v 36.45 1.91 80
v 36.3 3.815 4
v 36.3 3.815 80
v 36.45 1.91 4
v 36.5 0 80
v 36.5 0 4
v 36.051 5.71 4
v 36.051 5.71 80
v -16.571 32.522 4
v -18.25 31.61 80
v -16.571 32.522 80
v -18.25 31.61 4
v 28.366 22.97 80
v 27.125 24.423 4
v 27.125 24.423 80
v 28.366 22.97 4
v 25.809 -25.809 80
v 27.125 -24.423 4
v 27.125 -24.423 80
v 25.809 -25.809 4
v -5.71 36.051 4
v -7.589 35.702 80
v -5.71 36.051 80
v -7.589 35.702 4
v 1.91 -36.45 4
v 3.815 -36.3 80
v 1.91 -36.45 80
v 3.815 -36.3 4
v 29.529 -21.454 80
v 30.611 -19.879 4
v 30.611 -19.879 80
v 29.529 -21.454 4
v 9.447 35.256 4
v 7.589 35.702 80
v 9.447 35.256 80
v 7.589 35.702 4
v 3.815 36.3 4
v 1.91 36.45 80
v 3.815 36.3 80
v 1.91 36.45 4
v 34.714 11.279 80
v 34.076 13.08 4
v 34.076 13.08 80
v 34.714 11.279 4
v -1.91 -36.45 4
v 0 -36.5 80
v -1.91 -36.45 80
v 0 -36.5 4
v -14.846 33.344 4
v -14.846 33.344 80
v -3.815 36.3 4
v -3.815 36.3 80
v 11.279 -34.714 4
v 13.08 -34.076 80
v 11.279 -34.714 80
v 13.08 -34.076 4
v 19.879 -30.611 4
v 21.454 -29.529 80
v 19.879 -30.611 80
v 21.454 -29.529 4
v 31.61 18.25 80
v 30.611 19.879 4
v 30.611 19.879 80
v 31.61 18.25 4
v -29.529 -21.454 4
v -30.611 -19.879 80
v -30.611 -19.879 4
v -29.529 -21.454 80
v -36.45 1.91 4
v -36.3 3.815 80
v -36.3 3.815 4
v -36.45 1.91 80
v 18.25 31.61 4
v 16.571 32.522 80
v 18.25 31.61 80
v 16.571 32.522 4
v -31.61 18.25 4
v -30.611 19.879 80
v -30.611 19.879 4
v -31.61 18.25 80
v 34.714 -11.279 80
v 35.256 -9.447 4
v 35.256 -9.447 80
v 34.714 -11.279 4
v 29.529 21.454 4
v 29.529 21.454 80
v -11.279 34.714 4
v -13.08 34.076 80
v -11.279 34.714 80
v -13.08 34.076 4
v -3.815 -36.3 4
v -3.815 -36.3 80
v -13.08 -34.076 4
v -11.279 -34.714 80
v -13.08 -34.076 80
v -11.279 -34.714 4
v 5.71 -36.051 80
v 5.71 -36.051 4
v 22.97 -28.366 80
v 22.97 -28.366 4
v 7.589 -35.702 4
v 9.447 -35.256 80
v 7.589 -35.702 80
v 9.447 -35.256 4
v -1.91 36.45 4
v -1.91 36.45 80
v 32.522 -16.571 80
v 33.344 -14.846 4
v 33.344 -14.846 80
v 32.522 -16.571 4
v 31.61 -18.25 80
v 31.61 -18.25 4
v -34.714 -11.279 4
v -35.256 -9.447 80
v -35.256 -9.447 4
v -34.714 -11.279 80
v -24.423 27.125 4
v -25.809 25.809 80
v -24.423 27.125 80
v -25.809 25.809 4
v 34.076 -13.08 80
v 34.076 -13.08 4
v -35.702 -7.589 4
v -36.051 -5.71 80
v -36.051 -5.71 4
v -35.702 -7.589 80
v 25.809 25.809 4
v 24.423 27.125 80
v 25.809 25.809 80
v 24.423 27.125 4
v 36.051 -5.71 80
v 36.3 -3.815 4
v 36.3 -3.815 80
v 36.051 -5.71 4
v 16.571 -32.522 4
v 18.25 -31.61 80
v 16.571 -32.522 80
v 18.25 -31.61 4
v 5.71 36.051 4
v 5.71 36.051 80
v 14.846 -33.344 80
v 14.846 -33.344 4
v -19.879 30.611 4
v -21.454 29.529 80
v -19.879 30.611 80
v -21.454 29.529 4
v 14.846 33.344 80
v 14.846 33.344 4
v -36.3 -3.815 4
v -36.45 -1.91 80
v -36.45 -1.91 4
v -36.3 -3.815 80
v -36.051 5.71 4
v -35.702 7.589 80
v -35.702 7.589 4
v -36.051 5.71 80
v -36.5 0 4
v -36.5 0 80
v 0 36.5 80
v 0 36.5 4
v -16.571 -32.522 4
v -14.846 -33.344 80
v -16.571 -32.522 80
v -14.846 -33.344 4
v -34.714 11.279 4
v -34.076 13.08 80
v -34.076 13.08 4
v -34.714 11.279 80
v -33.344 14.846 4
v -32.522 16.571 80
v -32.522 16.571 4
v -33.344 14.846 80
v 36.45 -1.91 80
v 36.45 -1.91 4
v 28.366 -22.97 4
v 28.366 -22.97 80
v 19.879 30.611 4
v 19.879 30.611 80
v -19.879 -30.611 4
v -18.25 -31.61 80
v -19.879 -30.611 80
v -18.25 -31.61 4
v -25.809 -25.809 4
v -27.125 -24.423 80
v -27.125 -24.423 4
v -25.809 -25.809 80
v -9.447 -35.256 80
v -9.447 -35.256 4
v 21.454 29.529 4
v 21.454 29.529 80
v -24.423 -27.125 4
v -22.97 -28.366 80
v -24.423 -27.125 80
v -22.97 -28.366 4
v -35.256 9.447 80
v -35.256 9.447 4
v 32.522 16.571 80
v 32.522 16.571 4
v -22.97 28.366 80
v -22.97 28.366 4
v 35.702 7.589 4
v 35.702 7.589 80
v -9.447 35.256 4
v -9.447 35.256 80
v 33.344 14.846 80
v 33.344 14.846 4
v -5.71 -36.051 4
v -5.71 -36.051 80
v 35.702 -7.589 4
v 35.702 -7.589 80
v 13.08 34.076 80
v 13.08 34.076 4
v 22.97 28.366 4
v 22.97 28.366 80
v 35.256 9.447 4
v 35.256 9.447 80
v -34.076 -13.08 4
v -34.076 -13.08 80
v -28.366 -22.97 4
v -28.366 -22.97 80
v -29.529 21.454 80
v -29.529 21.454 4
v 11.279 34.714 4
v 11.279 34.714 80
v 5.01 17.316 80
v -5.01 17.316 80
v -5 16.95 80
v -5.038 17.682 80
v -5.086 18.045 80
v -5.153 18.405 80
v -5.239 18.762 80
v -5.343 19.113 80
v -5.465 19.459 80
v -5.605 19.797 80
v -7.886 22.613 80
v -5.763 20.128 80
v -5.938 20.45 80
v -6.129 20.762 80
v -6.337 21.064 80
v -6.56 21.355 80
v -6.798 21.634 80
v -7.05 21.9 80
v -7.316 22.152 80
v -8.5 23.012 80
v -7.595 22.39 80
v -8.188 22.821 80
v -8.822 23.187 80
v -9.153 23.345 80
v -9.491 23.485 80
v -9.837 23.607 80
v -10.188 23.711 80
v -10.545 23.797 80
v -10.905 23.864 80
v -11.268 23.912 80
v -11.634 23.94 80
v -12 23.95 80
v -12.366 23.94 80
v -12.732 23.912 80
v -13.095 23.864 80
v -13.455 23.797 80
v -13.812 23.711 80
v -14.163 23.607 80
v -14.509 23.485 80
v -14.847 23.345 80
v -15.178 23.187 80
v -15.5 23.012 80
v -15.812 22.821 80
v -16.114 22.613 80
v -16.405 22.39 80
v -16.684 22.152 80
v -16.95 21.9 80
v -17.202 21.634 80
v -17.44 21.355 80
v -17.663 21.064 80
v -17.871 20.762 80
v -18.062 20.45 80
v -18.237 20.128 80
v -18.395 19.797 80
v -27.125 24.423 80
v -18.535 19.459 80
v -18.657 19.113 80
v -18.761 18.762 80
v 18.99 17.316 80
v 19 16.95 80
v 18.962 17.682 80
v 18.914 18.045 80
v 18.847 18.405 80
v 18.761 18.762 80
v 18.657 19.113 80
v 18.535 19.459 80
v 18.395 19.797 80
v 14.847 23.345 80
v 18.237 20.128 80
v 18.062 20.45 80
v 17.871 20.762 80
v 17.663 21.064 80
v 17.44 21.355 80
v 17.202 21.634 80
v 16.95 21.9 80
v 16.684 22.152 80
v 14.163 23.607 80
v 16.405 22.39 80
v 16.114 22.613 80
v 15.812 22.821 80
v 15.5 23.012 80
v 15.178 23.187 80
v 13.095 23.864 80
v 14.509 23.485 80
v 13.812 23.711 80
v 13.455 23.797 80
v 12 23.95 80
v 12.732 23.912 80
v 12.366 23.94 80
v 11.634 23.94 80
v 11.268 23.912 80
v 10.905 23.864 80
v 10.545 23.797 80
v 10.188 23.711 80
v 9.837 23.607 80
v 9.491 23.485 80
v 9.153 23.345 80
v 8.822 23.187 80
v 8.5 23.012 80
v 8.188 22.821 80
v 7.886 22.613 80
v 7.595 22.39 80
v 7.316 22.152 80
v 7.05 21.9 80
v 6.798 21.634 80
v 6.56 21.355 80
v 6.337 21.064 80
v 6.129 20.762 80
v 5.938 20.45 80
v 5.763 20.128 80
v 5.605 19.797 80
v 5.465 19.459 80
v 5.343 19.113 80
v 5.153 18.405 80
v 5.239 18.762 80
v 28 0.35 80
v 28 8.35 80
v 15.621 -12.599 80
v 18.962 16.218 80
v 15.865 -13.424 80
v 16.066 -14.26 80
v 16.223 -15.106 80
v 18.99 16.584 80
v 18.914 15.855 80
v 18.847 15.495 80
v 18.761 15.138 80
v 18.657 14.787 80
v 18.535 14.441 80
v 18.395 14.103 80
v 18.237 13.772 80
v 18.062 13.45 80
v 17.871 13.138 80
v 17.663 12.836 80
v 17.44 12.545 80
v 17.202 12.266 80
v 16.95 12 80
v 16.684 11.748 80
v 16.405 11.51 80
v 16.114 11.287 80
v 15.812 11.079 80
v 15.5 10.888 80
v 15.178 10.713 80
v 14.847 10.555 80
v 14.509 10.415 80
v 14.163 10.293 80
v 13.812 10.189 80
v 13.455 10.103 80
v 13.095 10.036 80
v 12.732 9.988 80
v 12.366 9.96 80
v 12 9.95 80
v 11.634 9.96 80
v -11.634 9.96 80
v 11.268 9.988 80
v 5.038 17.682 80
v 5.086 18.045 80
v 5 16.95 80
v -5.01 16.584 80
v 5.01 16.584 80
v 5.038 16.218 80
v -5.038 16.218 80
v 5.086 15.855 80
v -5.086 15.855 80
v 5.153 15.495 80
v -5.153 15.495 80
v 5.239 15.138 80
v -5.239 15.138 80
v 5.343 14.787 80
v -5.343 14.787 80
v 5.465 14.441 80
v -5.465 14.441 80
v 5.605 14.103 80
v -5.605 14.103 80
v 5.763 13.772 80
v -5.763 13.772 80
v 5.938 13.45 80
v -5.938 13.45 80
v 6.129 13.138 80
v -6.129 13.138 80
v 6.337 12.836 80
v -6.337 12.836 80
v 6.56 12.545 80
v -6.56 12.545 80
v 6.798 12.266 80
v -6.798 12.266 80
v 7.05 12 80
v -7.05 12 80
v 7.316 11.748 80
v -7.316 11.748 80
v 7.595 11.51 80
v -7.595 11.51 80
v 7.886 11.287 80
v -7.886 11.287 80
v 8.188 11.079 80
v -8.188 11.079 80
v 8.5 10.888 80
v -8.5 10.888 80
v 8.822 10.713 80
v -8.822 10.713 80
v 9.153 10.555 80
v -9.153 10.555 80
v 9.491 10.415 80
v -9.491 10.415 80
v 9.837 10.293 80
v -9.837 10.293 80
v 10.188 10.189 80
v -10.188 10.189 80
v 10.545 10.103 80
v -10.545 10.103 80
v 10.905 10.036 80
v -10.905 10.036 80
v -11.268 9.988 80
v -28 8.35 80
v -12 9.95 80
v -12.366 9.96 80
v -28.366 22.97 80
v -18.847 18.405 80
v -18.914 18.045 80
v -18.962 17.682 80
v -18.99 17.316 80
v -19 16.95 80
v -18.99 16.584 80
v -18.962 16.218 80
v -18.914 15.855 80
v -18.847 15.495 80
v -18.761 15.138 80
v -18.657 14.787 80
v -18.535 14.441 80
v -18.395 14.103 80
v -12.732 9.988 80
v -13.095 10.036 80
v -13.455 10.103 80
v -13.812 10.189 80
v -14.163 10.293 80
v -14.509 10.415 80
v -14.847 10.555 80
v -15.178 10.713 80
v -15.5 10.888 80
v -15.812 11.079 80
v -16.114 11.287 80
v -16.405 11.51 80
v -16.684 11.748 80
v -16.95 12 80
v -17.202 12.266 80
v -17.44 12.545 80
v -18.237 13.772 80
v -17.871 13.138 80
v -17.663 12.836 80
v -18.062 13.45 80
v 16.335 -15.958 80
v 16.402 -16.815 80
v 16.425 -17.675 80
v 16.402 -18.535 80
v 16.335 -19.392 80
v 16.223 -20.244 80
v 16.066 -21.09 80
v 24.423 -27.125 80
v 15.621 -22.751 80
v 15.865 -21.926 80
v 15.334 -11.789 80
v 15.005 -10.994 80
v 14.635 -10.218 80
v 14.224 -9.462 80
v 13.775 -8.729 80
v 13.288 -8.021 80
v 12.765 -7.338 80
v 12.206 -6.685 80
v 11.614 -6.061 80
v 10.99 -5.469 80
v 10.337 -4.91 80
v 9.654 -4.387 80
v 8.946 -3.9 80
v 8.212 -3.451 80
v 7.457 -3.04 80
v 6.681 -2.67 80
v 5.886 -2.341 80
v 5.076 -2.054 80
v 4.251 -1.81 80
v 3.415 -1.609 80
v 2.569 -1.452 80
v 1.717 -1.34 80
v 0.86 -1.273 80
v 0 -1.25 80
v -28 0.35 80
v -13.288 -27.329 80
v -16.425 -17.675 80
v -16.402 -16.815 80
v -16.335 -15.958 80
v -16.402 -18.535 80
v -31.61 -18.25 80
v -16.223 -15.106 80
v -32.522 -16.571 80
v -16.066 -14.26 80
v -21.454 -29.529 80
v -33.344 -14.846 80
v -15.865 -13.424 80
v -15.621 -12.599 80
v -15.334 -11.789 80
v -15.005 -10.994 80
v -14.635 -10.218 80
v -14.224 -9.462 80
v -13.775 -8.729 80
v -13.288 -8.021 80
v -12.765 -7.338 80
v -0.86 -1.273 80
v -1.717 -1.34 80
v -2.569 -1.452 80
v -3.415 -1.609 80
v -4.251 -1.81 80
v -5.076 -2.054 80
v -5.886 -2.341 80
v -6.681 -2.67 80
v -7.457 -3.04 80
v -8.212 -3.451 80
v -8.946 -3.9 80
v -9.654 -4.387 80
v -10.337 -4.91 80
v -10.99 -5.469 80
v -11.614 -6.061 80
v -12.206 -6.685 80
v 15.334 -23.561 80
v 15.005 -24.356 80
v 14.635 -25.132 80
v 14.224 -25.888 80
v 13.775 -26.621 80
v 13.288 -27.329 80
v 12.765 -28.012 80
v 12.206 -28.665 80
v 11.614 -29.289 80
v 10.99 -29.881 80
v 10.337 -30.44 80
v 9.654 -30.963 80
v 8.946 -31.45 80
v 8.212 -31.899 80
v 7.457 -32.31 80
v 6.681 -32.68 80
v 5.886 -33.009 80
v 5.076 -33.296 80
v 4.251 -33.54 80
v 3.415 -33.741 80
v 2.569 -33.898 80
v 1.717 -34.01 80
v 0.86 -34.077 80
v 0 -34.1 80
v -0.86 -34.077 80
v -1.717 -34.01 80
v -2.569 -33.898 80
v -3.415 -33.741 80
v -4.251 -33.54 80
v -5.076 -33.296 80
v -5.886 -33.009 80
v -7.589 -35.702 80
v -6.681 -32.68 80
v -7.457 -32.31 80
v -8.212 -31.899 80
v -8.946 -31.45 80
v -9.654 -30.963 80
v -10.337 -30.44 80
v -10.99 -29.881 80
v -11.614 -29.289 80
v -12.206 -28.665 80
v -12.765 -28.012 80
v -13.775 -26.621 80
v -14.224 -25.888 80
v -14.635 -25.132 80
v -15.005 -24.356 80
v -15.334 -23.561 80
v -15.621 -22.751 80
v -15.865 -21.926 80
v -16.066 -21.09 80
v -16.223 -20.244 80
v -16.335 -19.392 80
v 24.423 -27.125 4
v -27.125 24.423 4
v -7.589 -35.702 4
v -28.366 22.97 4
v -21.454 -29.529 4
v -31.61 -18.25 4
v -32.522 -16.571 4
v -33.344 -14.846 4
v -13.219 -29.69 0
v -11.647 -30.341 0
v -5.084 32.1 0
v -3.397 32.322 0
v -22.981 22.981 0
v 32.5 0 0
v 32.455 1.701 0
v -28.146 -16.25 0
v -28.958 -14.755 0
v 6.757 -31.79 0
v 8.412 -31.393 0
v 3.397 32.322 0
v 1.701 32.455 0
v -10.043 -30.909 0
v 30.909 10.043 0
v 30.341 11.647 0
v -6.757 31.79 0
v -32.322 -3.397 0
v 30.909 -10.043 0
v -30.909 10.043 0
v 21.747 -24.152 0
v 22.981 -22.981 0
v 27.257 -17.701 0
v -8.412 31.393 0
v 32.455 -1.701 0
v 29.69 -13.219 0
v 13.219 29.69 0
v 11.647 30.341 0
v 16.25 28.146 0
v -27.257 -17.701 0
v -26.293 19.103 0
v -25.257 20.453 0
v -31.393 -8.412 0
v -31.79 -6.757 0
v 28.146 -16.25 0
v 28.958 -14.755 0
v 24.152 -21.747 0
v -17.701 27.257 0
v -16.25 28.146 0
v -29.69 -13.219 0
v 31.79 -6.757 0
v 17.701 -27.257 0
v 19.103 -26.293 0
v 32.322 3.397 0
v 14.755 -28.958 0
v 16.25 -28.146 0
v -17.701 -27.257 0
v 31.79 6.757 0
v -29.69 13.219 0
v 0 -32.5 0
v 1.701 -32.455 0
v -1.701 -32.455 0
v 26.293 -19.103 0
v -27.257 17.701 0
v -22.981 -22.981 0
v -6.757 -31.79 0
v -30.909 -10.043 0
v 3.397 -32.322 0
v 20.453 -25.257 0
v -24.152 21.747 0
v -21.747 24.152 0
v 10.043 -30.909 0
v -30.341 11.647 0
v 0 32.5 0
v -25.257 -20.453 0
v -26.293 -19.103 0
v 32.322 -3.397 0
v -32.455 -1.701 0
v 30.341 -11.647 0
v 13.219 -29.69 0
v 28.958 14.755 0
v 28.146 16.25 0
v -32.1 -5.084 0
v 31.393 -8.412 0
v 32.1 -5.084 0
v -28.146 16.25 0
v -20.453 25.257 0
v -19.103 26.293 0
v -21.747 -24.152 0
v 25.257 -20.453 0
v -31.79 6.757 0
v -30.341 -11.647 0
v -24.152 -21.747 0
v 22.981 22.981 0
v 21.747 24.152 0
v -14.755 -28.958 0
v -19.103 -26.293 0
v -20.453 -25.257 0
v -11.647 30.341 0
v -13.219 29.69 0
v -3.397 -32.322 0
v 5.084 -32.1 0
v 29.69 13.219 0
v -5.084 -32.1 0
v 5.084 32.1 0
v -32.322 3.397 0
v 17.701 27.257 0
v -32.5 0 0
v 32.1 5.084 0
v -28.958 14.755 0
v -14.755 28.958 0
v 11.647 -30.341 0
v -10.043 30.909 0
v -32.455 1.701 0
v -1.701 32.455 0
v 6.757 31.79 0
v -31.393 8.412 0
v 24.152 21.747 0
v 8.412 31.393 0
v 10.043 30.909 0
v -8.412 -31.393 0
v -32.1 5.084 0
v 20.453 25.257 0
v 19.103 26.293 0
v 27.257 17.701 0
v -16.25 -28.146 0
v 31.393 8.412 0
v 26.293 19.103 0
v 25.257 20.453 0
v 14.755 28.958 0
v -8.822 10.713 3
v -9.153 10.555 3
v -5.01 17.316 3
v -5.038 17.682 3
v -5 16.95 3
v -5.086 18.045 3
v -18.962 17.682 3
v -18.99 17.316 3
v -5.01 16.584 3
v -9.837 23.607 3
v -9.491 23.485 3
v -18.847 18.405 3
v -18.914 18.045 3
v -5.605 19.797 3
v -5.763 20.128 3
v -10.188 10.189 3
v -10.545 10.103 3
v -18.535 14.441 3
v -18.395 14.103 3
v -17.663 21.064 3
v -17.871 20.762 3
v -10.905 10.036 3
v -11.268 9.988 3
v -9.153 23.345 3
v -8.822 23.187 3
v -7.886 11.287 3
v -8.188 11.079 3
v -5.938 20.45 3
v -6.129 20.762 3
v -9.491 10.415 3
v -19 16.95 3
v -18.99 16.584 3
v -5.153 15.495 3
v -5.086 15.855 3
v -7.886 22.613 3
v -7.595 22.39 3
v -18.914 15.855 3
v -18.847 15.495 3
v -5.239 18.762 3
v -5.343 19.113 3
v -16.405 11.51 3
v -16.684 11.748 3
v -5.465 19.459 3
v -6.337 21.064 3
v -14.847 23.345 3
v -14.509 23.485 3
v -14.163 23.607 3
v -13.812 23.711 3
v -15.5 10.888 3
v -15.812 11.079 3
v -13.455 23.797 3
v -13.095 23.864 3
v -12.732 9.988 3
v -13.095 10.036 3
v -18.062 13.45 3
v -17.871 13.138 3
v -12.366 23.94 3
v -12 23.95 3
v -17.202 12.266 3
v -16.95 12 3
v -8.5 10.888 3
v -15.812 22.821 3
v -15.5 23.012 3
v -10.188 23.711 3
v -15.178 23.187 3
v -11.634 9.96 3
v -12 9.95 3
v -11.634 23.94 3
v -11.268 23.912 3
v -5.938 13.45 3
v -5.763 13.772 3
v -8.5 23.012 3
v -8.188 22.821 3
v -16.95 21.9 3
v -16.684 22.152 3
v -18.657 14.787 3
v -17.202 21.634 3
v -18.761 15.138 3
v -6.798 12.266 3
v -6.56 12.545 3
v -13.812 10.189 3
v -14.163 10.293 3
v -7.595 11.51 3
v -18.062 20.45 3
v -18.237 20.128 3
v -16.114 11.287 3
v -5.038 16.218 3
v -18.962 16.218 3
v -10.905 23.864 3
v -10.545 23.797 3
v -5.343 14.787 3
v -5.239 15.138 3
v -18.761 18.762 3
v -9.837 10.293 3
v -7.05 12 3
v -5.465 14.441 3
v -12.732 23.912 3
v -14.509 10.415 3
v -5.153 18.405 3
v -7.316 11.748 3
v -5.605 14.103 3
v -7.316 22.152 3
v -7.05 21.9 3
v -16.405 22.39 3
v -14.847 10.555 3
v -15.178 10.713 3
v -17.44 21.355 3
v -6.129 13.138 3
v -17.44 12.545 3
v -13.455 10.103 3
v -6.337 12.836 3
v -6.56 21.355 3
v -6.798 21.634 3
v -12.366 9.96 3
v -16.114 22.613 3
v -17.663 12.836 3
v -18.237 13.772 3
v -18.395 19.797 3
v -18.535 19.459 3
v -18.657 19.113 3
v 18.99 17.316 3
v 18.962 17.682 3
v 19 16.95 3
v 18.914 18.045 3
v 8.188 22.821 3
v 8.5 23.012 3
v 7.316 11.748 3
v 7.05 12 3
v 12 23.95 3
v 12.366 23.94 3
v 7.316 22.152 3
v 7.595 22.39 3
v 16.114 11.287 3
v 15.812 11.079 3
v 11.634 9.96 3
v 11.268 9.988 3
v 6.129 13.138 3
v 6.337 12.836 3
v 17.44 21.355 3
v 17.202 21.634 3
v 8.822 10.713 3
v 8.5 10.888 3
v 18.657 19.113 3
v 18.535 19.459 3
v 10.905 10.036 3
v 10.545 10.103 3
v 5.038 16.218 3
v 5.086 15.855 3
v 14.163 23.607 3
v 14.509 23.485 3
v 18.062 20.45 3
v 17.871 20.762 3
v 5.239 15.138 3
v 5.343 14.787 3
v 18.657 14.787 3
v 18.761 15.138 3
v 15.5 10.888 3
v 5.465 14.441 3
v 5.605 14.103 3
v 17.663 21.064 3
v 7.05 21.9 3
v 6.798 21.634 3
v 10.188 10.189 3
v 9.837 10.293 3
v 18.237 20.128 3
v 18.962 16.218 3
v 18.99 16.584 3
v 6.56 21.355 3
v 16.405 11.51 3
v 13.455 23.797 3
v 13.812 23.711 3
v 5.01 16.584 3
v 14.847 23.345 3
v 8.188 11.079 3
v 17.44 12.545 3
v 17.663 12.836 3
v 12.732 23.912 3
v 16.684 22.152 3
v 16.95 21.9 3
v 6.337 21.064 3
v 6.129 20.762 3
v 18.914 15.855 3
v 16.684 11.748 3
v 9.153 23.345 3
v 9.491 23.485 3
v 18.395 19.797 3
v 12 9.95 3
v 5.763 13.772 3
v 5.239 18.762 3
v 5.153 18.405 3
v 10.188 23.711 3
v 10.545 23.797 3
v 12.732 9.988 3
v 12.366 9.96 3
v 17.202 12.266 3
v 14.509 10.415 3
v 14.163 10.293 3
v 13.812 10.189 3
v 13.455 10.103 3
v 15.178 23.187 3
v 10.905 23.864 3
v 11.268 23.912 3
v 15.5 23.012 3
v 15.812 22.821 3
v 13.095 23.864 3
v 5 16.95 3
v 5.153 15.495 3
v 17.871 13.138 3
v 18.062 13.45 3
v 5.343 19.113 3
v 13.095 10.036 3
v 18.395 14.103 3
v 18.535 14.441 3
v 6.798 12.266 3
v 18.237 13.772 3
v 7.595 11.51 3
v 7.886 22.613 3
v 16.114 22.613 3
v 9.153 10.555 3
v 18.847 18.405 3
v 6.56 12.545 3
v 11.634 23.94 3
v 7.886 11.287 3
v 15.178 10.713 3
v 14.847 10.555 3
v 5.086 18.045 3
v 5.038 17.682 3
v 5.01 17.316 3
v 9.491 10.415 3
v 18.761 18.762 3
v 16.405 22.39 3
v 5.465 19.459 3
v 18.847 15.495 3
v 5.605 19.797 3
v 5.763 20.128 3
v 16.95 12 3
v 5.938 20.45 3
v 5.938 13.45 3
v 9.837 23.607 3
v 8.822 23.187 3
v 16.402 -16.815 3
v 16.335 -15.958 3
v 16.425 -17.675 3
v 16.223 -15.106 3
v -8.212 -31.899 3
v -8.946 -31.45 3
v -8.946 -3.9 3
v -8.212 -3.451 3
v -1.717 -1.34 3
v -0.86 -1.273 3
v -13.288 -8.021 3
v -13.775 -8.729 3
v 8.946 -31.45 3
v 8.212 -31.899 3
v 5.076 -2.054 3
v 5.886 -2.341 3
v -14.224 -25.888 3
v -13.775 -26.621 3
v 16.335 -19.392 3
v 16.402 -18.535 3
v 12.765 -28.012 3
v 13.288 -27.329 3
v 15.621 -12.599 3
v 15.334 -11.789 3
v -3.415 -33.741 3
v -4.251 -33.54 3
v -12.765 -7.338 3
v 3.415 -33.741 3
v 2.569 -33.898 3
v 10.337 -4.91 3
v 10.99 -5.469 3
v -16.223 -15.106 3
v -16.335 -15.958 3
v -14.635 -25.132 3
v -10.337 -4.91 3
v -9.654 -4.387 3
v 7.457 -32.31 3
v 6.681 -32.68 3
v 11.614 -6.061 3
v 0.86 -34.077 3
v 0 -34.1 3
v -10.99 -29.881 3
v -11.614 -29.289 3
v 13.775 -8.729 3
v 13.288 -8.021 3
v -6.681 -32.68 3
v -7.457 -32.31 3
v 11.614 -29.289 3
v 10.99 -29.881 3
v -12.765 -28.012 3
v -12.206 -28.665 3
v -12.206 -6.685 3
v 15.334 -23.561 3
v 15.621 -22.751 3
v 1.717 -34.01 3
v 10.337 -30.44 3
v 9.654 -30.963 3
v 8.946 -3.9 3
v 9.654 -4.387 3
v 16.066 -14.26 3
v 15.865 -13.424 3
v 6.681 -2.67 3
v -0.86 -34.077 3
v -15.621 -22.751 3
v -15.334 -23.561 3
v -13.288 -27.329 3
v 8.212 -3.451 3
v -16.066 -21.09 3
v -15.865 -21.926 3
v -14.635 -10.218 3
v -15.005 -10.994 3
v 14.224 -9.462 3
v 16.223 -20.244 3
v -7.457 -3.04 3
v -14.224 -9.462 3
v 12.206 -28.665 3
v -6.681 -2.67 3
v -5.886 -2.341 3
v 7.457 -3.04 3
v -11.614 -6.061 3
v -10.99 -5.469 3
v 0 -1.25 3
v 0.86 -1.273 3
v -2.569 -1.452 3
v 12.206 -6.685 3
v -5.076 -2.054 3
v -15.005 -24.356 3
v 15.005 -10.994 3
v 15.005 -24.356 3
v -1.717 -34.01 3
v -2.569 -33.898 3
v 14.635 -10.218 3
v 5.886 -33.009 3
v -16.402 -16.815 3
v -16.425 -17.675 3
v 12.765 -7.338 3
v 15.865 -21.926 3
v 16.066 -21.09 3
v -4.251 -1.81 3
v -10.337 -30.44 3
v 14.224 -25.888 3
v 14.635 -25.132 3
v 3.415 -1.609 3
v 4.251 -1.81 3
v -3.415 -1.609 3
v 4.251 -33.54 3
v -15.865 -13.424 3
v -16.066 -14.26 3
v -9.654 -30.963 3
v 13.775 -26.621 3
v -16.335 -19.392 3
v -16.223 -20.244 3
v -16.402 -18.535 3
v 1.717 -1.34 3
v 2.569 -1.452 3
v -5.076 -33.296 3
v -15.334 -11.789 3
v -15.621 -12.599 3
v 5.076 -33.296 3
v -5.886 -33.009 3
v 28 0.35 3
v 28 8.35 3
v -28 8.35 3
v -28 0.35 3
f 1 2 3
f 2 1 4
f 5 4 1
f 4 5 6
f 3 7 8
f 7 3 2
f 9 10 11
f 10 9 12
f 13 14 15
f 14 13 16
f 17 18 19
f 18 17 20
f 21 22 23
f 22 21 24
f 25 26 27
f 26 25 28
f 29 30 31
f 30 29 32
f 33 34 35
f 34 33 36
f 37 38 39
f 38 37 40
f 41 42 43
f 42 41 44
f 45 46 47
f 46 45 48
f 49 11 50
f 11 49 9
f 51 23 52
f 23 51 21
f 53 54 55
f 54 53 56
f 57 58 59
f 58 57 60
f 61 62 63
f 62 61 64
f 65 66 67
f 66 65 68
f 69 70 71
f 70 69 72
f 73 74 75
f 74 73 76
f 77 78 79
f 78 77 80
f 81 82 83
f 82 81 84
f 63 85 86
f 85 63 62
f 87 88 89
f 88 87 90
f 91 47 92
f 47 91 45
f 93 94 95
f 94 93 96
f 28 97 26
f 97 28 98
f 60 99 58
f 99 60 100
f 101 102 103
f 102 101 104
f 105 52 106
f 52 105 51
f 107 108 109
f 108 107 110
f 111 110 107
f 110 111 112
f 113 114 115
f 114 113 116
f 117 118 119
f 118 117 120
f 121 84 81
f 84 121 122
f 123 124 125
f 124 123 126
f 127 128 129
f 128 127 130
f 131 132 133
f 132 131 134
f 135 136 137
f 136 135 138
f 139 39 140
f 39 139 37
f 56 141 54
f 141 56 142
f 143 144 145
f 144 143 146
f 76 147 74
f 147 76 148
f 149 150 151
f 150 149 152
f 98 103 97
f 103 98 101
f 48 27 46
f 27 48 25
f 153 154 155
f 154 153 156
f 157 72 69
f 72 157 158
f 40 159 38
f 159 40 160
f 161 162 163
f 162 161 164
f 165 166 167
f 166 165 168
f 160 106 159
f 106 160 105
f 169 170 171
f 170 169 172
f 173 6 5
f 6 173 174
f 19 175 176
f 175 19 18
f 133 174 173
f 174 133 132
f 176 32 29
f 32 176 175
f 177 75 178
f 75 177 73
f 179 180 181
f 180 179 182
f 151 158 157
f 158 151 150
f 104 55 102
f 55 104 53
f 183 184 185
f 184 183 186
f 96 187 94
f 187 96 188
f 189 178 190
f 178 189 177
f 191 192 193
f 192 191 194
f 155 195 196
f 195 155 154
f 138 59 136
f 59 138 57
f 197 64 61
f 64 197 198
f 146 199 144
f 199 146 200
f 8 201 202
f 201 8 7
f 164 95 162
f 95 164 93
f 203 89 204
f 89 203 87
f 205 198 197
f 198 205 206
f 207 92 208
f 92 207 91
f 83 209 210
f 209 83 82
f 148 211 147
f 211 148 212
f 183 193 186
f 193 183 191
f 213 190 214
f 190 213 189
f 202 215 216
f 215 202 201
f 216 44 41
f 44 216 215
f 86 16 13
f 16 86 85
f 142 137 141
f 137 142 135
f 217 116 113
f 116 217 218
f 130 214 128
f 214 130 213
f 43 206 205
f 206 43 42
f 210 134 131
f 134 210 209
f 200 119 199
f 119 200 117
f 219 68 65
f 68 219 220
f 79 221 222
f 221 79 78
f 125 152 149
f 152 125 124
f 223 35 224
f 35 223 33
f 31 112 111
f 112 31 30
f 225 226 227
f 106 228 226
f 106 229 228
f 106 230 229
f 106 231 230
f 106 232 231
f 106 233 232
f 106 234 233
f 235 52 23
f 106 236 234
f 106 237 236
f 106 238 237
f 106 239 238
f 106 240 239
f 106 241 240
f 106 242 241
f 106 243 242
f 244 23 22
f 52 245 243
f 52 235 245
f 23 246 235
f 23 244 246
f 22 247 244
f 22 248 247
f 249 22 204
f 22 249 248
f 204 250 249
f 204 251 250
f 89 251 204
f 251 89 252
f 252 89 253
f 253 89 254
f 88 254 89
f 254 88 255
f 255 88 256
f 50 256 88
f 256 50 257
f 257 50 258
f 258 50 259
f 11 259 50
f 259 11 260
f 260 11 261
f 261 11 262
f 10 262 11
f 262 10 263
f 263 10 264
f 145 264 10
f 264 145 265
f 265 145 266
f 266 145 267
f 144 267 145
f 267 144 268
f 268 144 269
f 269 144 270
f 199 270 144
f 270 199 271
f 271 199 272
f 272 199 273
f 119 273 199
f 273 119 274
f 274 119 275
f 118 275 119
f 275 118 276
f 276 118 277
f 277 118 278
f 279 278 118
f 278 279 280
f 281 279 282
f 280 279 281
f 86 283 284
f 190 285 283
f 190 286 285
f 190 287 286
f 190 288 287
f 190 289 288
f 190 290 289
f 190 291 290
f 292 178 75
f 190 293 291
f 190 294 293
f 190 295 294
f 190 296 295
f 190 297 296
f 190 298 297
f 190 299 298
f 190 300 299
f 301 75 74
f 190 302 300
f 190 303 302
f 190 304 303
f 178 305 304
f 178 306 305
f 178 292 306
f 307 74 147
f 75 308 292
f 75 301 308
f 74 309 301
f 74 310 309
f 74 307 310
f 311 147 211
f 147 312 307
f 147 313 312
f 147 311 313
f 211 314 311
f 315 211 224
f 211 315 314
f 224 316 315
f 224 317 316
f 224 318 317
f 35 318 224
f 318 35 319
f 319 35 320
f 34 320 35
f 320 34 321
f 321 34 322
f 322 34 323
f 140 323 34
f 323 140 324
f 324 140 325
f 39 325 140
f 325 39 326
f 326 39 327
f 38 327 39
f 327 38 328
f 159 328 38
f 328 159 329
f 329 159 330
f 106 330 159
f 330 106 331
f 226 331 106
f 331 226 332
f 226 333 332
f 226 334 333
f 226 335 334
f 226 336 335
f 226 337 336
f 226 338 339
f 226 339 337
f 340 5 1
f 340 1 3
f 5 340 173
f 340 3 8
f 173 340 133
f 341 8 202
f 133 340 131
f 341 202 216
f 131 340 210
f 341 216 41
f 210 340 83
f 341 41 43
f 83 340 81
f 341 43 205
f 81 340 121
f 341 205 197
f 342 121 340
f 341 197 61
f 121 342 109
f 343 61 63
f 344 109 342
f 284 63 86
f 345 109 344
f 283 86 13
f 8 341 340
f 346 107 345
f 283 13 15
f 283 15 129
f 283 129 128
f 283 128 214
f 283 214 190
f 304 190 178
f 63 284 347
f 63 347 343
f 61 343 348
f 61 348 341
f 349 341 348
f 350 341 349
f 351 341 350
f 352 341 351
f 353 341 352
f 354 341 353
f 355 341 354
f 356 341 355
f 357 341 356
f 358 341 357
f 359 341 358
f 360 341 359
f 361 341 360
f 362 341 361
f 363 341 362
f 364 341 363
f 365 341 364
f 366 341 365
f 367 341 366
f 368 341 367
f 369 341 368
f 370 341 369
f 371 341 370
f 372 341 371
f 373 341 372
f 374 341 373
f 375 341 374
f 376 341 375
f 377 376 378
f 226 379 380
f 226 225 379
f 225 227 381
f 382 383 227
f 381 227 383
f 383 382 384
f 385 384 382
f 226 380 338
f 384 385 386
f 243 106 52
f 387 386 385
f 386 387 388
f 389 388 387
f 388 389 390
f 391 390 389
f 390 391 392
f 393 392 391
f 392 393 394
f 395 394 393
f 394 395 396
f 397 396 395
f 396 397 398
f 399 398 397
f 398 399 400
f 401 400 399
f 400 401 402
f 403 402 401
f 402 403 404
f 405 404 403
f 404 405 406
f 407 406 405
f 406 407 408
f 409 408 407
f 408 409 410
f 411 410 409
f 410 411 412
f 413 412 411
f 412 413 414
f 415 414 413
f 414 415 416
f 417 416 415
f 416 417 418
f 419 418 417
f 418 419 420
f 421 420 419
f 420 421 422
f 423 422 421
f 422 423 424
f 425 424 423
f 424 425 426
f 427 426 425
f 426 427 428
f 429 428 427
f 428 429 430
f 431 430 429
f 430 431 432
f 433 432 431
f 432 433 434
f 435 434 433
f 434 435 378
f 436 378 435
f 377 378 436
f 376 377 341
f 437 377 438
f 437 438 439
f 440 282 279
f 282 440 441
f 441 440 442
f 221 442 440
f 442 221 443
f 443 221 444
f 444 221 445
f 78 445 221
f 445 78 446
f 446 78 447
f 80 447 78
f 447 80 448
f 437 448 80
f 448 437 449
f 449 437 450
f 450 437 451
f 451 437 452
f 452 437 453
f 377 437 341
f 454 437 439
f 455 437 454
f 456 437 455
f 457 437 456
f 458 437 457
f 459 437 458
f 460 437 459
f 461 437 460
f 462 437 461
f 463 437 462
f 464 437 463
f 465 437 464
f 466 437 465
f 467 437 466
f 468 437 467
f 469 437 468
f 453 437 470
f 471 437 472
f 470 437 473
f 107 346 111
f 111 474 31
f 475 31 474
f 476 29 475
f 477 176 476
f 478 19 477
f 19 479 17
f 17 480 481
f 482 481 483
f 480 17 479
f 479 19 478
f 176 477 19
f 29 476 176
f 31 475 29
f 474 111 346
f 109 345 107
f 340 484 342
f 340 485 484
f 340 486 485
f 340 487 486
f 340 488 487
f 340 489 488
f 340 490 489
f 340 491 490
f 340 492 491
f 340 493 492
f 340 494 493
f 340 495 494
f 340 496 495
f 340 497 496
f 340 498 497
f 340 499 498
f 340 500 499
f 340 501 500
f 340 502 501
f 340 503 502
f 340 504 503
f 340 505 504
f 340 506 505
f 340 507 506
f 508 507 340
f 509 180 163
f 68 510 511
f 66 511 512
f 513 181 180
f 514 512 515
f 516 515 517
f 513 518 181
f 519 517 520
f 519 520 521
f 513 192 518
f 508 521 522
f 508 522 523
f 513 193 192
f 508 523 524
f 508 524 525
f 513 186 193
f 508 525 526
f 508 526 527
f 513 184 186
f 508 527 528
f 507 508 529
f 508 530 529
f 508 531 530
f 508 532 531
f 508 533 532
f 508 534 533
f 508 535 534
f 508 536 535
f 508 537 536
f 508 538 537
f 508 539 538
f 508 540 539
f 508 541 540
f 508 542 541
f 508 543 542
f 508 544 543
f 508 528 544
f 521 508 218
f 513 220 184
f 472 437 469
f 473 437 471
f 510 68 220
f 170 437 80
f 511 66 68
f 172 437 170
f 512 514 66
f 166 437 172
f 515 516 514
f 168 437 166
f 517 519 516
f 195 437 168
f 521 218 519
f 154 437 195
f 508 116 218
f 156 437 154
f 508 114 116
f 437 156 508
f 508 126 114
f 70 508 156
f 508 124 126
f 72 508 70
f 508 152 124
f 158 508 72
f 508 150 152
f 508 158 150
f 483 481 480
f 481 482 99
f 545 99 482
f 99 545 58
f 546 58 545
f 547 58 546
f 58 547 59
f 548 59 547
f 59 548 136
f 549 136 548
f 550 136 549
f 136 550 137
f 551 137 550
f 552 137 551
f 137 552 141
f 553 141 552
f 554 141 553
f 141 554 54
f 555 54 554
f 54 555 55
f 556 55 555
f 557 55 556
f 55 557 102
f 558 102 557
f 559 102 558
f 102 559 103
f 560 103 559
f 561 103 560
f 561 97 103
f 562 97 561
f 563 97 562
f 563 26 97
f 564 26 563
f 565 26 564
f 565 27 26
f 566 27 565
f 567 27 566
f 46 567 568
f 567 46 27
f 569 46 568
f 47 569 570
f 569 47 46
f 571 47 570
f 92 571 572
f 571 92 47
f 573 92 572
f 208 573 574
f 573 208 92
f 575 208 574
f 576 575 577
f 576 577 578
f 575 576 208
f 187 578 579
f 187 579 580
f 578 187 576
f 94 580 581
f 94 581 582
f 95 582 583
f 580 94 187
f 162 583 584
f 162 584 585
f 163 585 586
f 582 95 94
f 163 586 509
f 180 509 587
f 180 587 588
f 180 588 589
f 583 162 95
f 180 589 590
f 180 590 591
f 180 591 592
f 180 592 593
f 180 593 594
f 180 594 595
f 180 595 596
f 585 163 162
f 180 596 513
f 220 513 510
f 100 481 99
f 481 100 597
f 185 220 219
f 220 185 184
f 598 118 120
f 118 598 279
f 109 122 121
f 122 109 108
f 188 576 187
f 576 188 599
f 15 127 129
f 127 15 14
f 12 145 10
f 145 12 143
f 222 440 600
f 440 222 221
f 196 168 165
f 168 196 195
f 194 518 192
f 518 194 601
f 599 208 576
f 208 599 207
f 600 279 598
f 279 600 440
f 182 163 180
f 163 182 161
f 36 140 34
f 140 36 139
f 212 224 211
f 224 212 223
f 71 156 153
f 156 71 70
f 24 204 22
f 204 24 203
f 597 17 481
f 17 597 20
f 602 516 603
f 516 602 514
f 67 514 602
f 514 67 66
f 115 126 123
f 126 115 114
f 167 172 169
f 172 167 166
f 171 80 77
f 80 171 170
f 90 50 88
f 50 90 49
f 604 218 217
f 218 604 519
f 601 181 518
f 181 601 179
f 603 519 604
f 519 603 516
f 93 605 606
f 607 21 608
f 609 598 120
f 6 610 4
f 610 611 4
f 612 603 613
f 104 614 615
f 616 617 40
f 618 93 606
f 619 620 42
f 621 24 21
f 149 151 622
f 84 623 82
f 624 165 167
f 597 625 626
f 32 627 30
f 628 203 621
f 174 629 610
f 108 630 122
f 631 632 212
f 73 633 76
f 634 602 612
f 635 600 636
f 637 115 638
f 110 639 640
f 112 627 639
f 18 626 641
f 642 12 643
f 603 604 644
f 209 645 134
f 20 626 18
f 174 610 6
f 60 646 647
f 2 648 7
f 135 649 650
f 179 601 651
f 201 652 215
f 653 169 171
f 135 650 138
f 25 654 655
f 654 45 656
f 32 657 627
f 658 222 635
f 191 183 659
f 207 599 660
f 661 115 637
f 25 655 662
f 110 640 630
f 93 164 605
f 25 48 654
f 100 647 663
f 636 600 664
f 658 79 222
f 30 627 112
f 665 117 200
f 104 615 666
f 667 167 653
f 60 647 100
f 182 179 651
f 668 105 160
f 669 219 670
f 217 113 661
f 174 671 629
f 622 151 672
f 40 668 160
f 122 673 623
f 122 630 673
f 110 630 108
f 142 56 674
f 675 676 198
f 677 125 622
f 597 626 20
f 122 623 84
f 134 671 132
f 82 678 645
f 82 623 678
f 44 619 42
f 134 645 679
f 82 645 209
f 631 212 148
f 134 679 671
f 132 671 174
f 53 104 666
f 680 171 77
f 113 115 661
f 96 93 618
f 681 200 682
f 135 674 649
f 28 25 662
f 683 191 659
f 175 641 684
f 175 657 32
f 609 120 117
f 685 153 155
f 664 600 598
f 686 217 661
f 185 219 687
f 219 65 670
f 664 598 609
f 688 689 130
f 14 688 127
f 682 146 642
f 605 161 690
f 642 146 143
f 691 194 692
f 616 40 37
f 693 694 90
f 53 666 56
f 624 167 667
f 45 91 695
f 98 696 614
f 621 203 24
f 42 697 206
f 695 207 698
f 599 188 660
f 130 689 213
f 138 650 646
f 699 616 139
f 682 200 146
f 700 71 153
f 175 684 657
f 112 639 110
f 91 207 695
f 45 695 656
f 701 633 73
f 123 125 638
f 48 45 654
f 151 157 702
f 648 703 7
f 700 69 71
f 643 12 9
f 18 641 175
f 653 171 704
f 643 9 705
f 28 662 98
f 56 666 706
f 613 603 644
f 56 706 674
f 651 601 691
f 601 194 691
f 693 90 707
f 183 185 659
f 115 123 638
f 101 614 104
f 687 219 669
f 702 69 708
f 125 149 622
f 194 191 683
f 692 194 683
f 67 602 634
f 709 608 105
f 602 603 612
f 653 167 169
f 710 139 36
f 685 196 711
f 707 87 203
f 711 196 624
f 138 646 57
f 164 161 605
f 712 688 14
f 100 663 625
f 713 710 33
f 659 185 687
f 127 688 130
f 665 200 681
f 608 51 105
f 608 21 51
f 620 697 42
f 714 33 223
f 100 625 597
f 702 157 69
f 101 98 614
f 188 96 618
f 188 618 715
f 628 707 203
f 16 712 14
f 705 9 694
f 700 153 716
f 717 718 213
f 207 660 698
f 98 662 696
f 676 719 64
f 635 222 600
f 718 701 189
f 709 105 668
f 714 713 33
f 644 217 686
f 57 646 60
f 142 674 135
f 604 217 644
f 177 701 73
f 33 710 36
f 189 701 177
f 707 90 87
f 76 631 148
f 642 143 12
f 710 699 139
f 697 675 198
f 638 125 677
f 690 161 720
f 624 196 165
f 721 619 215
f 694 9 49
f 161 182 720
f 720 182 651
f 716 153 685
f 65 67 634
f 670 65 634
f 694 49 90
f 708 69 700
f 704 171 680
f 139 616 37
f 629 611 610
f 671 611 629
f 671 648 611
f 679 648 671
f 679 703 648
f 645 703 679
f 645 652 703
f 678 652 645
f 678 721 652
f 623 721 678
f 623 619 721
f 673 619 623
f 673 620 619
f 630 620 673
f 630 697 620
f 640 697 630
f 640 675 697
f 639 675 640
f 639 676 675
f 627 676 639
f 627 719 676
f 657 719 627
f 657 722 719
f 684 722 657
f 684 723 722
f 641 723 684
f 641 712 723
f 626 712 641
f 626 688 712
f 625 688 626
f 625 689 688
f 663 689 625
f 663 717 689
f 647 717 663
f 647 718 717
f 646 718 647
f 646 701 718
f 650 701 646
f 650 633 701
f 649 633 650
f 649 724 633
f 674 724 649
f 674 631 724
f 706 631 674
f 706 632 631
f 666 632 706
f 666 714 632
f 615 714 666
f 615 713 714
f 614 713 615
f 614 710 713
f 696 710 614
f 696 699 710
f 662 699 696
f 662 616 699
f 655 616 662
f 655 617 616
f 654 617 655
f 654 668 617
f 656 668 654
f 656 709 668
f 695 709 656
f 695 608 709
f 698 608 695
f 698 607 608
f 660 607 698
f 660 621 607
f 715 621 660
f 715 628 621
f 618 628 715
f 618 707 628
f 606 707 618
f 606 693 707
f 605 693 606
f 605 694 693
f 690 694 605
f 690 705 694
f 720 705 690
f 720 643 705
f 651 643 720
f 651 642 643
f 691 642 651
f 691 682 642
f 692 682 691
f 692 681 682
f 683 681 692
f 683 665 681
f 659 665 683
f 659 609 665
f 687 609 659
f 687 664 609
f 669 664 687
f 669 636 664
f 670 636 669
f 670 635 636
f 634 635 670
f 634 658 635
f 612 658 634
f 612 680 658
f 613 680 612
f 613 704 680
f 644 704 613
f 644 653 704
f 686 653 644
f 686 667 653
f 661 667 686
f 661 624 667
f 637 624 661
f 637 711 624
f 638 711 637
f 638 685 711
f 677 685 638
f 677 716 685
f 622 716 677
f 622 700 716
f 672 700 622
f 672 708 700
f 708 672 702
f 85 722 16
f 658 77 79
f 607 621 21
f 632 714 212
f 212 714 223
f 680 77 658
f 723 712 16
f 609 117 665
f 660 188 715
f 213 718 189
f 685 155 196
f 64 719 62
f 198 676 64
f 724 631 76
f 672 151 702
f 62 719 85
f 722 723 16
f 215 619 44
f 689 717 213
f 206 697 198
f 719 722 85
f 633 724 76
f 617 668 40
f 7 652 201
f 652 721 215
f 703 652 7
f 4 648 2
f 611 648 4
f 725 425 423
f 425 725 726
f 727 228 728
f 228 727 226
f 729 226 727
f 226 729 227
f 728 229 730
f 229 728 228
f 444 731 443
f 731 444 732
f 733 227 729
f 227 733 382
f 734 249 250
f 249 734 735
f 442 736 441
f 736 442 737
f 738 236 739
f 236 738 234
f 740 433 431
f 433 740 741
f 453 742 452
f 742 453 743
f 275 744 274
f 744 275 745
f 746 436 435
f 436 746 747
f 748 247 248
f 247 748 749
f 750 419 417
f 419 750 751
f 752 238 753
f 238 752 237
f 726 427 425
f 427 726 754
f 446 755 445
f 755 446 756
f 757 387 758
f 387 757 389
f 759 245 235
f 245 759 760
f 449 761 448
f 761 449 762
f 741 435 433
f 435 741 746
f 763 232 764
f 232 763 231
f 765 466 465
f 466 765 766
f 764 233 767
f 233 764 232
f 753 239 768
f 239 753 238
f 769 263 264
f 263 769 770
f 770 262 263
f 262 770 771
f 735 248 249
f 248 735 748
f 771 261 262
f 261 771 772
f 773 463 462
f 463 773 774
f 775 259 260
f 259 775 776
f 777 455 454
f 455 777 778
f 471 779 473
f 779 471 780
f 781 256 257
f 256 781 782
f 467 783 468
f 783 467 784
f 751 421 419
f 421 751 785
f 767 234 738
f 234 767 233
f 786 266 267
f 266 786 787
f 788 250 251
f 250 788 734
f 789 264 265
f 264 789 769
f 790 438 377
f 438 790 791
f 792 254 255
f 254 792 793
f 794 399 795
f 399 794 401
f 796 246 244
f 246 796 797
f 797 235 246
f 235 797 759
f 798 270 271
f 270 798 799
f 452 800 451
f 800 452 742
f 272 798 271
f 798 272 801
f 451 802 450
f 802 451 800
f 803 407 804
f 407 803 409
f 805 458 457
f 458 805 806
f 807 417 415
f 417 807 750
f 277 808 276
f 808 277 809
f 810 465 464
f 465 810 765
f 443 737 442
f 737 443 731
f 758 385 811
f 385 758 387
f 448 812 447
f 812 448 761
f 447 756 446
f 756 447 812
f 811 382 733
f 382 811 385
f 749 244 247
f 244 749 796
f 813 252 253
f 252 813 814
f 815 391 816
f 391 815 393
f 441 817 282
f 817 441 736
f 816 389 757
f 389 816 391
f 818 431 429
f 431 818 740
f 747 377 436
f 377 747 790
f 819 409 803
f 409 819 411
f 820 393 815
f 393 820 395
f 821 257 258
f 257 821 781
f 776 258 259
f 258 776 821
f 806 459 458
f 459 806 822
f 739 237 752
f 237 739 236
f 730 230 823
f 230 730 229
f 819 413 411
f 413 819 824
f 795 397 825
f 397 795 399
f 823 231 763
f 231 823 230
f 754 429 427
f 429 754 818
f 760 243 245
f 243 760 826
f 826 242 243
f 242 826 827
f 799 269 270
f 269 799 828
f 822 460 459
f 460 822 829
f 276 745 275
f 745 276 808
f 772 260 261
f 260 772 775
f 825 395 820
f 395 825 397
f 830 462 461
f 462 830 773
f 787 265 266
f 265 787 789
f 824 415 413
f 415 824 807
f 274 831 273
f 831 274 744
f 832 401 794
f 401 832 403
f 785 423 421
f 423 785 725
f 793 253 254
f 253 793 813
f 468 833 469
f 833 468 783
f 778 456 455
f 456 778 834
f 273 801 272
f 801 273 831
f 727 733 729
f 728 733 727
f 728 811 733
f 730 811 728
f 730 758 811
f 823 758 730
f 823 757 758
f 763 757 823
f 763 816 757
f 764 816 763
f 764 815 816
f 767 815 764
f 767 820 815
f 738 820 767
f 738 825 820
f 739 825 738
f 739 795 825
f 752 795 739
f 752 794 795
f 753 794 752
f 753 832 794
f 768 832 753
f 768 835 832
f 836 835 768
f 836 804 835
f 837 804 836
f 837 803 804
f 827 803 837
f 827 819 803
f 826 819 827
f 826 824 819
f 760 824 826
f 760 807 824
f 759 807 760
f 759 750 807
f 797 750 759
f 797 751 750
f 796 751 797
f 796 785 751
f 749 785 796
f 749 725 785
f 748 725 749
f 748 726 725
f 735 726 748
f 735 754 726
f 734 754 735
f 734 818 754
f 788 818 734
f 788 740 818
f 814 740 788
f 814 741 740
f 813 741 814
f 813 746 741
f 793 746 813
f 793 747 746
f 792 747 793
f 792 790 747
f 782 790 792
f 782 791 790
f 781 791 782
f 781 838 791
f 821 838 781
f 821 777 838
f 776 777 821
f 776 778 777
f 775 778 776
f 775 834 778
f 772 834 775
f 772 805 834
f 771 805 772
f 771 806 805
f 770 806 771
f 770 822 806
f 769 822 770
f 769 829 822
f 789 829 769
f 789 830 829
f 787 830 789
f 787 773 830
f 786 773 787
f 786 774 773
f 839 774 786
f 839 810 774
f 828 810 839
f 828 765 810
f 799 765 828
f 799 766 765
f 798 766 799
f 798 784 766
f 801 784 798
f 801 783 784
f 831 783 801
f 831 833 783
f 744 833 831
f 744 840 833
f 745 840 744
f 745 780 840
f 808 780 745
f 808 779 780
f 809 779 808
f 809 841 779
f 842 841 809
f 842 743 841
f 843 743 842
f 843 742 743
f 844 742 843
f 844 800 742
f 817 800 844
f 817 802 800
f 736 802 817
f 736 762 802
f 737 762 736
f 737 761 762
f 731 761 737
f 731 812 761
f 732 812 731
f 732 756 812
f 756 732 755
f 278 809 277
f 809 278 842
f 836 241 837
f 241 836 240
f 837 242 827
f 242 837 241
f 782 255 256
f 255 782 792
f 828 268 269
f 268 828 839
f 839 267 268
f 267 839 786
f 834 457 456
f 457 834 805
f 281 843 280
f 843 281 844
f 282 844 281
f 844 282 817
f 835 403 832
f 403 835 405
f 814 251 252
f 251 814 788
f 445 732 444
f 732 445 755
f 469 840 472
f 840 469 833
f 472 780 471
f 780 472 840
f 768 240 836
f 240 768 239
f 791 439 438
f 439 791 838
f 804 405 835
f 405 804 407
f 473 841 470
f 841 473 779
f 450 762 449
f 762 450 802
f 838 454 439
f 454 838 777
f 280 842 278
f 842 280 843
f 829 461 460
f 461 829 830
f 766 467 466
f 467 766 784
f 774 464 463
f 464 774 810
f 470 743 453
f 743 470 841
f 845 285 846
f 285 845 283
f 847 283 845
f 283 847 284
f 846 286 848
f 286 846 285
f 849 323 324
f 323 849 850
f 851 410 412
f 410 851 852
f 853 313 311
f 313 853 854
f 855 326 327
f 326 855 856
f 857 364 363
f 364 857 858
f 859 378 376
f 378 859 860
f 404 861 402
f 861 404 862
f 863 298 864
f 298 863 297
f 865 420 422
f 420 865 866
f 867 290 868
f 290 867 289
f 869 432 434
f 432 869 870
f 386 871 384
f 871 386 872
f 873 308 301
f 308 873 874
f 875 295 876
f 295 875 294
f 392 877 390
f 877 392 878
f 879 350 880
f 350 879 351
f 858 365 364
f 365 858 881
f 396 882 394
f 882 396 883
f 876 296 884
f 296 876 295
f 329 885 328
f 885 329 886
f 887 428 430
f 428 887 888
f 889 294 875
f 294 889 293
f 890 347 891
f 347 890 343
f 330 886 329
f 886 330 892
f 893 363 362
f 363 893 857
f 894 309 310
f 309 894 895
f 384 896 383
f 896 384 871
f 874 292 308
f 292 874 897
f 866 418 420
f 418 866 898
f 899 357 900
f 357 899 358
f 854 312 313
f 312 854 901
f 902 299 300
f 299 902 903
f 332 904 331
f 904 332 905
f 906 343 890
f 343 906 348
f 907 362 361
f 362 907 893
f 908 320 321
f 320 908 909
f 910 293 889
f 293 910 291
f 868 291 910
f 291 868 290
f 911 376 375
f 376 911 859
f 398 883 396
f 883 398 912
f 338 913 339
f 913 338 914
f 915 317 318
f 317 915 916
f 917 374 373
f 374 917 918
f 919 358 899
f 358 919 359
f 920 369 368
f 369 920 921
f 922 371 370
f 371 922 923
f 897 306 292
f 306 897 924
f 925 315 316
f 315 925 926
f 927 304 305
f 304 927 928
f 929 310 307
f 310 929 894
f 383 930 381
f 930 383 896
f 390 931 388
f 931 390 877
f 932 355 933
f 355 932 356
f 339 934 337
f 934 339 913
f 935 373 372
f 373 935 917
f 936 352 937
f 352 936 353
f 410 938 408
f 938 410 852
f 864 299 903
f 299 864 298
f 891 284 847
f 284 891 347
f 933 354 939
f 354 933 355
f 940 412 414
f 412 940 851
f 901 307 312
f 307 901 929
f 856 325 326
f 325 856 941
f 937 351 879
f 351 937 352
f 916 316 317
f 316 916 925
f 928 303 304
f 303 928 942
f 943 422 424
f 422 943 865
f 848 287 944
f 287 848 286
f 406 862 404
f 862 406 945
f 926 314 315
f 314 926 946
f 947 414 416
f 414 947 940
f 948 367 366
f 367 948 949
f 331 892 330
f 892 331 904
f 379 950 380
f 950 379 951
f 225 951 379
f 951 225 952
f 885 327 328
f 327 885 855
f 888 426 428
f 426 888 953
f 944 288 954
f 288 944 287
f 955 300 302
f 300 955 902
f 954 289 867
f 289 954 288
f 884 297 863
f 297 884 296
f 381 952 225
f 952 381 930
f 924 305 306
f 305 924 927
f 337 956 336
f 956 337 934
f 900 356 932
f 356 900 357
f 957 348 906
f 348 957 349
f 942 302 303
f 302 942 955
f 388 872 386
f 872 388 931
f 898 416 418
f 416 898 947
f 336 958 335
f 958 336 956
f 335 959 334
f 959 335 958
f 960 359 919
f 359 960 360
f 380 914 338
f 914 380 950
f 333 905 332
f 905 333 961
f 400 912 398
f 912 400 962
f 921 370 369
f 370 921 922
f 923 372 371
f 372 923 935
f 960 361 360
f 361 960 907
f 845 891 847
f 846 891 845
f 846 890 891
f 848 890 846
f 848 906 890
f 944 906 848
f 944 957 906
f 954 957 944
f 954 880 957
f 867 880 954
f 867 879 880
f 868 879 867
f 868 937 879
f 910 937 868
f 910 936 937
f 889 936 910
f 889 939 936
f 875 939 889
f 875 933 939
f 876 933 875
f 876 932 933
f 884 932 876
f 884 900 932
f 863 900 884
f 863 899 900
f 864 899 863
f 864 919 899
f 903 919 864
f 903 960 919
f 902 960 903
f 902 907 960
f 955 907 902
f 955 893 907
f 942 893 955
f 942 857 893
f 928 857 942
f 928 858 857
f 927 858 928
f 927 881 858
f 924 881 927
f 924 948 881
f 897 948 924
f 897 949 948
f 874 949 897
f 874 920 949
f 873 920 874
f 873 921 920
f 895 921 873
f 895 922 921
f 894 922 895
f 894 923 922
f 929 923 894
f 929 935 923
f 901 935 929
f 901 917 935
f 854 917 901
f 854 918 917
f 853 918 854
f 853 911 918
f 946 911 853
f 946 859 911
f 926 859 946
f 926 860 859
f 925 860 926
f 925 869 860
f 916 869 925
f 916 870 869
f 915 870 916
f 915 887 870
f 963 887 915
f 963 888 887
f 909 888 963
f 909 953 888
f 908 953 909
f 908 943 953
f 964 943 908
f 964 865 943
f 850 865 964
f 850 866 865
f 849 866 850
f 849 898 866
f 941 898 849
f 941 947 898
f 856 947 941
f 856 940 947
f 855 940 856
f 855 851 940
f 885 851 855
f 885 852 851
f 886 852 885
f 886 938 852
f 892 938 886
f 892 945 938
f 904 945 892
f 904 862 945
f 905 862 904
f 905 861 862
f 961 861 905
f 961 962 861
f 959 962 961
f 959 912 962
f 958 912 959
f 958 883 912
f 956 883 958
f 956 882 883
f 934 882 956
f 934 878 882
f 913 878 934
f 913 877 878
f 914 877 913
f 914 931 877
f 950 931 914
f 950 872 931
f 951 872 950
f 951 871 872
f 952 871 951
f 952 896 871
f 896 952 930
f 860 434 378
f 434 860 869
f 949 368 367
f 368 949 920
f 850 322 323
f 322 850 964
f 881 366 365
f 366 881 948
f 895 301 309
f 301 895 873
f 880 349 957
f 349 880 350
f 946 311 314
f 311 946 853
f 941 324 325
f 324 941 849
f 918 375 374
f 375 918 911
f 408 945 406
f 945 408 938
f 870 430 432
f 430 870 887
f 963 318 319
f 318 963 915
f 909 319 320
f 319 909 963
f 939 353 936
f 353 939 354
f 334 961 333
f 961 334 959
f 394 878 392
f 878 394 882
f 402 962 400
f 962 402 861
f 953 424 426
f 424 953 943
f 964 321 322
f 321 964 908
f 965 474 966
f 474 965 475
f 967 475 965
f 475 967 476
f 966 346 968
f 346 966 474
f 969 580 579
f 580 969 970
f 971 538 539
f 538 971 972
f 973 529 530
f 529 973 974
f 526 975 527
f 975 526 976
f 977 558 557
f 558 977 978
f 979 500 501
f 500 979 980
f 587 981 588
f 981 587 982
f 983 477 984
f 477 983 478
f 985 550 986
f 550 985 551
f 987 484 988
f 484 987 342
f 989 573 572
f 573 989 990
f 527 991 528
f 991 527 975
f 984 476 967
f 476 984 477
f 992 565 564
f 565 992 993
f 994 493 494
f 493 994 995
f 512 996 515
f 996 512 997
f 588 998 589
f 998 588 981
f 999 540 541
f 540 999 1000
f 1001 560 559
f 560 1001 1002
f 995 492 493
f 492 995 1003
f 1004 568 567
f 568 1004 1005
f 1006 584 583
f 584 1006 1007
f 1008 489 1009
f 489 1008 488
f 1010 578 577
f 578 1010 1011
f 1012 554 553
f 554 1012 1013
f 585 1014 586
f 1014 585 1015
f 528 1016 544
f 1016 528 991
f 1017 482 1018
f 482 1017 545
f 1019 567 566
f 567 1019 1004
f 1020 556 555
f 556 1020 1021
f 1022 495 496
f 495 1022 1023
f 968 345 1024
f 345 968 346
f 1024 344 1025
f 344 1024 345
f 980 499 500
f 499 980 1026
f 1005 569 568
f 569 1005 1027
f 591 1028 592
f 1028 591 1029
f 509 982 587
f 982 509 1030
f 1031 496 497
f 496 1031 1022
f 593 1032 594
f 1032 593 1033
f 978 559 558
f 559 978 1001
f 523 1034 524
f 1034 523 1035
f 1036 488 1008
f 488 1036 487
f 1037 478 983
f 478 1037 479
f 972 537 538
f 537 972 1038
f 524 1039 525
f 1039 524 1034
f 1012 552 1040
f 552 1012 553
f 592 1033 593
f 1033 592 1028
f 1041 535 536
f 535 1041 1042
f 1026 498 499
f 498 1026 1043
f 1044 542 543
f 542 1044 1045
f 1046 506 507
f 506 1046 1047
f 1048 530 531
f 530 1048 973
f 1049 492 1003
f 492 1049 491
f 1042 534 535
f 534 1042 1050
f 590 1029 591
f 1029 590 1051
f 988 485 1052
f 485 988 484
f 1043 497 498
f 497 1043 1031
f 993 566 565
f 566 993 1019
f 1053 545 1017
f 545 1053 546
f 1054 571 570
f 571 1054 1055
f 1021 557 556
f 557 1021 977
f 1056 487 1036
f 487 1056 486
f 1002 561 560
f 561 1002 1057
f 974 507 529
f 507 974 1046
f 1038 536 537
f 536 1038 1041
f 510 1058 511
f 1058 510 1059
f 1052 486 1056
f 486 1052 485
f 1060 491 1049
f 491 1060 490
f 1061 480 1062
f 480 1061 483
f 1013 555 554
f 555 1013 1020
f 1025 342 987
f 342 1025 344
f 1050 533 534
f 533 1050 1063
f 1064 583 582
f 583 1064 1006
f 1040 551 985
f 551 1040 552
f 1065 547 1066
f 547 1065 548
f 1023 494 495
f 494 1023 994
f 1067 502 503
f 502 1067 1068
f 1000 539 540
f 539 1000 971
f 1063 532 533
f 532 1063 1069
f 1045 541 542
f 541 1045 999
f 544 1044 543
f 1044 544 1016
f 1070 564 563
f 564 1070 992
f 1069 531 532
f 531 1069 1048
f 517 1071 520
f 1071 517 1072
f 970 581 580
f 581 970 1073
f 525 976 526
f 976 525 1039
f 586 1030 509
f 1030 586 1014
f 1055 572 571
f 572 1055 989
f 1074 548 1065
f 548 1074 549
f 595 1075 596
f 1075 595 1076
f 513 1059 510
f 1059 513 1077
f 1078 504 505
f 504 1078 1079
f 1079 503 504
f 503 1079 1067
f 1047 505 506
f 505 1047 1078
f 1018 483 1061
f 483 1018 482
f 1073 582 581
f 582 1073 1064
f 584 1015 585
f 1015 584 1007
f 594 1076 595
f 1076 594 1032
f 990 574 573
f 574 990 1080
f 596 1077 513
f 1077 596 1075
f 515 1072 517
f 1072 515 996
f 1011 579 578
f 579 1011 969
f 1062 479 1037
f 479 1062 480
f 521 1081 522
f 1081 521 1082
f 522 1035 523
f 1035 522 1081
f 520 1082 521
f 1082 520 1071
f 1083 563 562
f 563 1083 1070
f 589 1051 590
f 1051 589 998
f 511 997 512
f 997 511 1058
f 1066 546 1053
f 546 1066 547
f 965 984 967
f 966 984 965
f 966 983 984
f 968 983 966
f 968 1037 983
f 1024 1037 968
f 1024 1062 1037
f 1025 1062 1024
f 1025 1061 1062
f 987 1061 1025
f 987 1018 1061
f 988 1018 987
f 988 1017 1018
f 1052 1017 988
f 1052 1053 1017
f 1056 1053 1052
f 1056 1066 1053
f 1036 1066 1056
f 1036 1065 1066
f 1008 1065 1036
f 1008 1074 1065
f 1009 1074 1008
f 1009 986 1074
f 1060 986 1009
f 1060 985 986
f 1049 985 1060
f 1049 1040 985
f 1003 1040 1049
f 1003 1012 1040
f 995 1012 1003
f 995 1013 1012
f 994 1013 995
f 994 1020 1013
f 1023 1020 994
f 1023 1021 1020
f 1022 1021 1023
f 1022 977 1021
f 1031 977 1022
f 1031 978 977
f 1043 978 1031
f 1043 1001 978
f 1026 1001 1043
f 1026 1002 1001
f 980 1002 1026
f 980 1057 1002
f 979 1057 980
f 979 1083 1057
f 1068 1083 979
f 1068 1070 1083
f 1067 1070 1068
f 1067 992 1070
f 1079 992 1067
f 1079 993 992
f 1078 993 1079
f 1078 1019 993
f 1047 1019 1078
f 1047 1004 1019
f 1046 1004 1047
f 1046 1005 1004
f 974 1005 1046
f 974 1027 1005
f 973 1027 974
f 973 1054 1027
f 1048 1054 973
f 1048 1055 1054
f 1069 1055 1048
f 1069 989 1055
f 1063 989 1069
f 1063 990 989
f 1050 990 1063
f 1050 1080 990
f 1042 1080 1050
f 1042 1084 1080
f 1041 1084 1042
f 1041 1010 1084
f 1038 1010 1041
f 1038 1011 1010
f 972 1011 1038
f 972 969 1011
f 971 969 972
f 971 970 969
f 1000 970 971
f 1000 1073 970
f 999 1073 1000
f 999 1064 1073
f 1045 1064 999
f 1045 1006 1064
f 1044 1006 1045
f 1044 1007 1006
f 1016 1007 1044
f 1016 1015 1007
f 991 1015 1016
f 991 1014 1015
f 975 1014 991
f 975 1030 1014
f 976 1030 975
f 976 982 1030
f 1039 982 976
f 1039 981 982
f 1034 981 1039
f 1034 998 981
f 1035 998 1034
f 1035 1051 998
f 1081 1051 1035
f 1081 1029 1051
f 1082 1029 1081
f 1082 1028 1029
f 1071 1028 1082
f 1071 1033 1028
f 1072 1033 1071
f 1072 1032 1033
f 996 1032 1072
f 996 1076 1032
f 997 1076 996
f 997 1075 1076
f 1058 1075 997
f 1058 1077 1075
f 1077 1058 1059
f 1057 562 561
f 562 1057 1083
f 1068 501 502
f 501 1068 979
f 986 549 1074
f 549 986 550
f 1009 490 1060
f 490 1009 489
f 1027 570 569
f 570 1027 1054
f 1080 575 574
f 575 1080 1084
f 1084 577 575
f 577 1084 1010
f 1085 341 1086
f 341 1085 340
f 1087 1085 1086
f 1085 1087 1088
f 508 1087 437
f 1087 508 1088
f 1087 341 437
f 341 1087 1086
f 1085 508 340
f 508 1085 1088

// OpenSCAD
// Car cup-holder organizer insert: coin cup, card slot and two pen / lip-balm holes. Original design (Brian Sacco)
// dia = the inside diameter of YOUR cup holder (measure at the narrowest point). The insert is 1.0 mm smaller.
// Prints standing, open side up, no supports (the bottom edge has a 45 degree lead-in).
dia = 74;
height = 80;
floor_t = 3;
wall = 1.6;
$fn = 120;

OD = dia - 1.0;
R  = OD / 2;
coin_d = 0.9 * R;                       // coin cup
pen_d  = 14;
cy  = -R + 2.4 + coin_d / 2;            // coin cup centre (2.4 mm wall at the bottom)
sy0 = cy + coin_d / 2 + wall;           // card slot start
sy1 = sy0 + 8;                          // card slot end (8 mm deep)
py  = sy1 + wall + pen_d / 2;           // pen holes centre

module pockets() {
    translate([0, cy, floor_t]) cylinder(d = coin_d, h = height);
    translate([-28, sy0, floor_t]) cube([56, 8, height]);                     // cards stand on the short edge
    for (sx = [-1, 1]) translate([sx * 12, py, floor_t]) cylinder(d = pen_d, h = height);
}
difference() {
    union() {
        translate([0, 0, 4]) cylinder(r = R, h = height - 4);
        cylinder(r1 = R - 4, r2 = R, h = 4);          // 45 degree lead-in
    }
    pockets();
}
